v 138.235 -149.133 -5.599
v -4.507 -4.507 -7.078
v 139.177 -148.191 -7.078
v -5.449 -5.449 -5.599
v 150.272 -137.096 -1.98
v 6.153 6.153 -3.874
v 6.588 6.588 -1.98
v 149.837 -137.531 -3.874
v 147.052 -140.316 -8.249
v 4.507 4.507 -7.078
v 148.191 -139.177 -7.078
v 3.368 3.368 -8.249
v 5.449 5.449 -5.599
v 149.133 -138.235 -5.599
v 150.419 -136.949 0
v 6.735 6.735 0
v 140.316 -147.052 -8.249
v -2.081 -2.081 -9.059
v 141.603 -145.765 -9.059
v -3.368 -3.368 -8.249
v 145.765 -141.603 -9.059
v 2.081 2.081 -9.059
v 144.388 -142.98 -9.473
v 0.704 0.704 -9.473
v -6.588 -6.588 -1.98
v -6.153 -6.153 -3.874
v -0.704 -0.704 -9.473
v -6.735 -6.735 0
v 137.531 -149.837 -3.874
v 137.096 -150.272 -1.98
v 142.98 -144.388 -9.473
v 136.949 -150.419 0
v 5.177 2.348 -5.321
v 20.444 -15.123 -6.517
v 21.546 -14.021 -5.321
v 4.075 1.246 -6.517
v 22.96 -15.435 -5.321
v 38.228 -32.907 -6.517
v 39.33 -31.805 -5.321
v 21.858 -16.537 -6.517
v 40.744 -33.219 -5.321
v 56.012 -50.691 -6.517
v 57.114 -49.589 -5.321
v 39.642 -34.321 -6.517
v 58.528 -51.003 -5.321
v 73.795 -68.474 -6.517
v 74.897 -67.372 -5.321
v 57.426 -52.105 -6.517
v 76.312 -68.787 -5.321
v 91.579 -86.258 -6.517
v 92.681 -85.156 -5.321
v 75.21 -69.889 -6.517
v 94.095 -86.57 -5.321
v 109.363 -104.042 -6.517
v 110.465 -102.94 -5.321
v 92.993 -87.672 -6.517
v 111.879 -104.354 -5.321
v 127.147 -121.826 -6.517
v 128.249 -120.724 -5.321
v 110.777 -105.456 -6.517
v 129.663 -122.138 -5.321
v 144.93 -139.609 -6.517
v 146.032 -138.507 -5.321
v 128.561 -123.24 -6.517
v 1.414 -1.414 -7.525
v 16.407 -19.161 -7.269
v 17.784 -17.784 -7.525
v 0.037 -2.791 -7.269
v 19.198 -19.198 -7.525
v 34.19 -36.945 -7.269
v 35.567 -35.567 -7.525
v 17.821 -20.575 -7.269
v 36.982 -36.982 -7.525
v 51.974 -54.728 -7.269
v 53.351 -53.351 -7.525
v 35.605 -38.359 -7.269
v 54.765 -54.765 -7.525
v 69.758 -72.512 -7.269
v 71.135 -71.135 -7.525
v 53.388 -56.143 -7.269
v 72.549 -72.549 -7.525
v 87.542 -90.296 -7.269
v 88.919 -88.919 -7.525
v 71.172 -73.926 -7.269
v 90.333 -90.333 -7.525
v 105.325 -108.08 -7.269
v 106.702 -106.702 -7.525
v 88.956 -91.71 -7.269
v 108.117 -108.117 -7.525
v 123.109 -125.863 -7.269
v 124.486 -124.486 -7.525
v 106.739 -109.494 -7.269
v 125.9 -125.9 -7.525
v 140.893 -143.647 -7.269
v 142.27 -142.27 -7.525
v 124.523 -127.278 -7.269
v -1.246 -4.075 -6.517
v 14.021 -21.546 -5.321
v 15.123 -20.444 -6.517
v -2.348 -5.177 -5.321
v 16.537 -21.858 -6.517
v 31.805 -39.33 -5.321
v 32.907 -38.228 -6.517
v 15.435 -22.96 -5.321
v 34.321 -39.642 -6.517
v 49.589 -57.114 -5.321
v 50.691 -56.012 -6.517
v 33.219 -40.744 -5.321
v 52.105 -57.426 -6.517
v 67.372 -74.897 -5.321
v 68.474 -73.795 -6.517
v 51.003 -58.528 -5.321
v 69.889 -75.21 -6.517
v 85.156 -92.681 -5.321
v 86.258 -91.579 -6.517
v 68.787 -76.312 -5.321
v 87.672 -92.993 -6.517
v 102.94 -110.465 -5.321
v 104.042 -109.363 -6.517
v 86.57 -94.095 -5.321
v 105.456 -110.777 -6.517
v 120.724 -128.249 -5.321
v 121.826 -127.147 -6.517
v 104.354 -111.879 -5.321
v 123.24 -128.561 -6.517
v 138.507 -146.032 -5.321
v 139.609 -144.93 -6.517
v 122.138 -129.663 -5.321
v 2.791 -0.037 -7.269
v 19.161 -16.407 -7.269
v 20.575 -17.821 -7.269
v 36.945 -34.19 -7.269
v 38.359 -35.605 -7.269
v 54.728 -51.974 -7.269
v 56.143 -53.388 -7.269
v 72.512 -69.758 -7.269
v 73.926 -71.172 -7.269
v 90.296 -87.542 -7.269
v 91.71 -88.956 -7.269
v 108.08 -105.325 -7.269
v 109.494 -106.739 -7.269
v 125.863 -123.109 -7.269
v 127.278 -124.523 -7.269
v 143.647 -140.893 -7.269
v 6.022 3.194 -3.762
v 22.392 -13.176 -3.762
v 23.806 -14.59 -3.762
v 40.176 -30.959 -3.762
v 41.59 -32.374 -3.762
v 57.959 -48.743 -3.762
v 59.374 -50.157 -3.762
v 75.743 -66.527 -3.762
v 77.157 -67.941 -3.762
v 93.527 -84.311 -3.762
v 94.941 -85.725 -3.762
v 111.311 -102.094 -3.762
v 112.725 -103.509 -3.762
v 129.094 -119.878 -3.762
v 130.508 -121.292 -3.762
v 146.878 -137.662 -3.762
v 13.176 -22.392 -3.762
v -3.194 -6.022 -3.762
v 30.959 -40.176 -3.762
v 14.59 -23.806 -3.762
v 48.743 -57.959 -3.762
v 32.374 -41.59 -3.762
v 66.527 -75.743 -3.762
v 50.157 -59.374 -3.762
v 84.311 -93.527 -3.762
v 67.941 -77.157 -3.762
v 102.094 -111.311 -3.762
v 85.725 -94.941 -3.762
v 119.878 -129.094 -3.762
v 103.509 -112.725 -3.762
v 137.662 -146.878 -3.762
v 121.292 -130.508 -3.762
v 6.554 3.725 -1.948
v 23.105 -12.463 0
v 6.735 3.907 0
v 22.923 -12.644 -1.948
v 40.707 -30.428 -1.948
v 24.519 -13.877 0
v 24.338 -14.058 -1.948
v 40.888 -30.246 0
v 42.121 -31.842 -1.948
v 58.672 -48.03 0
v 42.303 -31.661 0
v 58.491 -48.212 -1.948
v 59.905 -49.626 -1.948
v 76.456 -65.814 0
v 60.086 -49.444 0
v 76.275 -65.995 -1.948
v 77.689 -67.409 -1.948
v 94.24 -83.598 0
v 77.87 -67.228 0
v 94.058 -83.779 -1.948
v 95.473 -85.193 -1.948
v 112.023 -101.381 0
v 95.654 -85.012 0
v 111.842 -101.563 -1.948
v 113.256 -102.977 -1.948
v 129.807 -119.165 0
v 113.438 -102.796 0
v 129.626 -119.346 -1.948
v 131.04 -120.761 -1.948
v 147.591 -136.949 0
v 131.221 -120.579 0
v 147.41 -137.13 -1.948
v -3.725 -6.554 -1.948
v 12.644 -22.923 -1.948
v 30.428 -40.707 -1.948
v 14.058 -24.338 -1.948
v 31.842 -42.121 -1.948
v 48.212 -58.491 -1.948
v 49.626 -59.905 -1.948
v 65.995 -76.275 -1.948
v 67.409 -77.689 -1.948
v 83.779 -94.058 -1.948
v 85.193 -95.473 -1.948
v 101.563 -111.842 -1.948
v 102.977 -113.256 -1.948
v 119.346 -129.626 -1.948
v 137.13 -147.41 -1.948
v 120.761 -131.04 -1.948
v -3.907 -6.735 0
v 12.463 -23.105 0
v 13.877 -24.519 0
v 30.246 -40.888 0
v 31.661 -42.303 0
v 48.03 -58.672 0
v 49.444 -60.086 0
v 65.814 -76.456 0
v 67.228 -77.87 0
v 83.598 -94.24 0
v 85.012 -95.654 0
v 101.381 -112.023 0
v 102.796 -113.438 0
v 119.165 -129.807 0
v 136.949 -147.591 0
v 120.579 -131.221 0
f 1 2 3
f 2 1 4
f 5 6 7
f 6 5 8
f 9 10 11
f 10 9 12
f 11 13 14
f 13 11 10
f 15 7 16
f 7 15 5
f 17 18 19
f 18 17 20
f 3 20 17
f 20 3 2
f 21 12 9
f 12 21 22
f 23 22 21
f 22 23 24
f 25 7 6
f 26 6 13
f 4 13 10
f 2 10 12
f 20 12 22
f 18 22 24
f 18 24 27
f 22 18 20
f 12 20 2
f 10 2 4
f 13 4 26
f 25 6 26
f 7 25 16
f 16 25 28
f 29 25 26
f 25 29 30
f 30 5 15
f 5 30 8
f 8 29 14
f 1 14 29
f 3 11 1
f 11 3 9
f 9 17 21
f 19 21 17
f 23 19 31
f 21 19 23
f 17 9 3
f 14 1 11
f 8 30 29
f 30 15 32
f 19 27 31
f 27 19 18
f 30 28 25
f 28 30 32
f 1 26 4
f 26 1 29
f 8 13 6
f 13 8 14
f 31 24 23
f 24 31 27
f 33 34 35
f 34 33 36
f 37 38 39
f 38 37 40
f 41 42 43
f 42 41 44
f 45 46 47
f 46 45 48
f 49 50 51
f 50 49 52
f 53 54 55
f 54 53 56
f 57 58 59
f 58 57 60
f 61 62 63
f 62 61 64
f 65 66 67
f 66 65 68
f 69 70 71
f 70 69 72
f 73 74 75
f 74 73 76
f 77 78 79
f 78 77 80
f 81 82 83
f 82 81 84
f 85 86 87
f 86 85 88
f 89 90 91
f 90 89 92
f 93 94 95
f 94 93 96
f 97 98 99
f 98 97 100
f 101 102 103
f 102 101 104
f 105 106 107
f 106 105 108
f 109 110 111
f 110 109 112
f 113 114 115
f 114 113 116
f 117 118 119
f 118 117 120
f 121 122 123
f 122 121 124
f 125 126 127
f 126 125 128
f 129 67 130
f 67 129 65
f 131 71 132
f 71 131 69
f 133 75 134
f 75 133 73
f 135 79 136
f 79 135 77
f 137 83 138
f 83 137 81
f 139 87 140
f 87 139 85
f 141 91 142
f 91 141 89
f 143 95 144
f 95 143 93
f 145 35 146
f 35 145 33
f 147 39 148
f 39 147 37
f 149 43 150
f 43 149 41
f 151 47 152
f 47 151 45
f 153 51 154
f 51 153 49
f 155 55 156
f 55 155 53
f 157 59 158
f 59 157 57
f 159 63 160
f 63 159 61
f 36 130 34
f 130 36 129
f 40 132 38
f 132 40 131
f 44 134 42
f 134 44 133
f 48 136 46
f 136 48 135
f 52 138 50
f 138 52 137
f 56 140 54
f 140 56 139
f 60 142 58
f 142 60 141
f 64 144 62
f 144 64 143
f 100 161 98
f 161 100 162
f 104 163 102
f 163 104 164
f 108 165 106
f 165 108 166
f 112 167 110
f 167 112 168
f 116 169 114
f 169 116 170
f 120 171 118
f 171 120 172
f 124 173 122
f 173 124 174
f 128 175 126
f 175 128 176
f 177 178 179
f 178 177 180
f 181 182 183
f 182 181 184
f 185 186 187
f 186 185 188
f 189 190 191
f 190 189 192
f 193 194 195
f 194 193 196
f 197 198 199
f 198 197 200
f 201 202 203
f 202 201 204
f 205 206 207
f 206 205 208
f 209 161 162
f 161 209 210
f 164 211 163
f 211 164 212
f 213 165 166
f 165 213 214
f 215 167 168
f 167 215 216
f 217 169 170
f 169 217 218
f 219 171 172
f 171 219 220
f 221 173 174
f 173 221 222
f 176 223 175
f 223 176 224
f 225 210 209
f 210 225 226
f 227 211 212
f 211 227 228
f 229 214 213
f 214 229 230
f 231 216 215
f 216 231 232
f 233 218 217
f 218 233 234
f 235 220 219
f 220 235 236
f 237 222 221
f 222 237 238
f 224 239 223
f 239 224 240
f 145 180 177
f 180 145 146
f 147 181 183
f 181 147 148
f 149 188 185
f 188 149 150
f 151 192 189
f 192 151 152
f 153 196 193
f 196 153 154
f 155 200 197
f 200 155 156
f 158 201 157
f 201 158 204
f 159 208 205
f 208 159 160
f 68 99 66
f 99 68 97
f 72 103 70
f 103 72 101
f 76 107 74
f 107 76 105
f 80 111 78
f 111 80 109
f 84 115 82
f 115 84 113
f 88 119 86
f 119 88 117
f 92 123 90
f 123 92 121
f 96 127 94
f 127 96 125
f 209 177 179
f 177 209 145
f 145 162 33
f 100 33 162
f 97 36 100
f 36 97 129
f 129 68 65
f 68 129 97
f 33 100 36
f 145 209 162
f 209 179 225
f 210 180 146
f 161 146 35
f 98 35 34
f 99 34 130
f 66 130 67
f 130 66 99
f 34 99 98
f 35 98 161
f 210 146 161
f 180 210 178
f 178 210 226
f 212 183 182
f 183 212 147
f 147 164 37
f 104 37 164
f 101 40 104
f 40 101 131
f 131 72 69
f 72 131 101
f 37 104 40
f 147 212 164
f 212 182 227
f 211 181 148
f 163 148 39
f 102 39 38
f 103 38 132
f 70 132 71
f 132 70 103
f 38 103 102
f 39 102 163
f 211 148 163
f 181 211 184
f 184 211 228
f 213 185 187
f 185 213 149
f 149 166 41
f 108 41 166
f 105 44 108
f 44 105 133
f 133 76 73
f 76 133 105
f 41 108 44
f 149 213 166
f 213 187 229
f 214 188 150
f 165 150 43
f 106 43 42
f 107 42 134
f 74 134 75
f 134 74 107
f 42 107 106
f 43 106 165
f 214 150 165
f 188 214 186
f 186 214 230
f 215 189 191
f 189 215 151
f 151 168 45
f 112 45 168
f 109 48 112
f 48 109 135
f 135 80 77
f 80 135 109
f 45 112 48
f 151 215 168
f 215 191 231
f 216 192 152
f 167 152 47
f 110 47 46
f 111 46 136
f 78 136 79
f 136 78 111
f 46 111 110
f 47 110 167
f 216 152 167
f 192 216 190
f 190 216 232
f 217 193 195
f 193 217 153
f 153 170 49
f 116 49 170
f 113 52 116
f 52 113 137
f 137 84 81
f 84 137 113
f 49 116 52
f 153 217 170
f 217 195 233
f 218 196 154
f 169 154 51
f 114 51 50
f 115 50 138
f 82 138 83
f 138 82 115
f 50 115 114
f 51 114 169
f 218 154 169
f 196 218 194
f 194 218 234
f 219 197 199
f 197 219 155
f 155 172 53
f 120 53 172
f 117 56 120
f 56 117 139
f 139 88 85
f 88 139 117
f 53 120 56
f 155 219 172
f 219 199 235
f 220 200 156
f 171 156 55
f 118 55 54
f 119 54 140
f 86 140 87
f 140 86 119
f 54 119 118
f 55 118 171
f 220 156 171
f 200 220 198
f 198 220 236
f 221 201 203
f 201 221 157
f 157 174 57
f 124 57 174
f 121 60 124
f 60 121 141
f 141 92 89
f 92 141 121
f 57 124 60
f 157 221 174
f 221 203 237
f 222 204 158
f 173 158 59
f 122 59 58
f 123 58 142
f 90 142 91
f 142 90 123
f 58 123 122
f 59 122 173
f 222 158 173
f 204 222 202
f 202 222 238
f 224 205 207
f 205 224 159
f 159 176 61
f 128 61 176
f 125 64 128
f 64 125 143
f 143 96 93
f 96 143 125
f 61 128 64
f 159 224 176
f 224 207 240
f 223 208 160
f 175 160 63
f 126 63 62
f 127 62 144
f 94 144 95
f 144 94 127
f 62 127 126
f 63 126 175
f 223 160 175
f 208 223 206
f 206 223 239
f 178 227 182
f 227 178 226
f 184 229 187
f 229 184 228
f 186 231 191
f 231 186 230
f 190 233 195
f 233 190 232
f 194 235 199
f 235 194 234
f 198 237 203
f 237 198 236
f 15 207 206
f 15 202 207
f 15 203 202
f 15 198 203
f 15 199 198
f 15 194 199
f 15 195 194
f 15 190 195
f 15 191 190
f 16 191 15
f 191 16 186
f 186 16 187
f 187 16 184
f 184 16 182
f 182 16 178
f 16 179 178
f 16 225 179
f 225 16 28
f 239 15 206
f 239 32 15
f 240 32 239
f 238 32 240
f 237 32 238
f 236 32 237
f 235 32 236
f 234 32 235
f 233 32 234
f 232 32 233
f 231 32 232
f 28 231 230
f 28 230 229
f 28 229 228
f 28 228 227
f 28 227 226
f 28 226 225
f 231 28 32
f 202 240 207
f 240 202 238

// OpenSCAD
rod_r1 = (0.75*25.4)/2;
rod_r0 = rod_r1 - 2;
rod_len = (8*25.4);

wall_t = 2;

e = 0.1;

module rod() {
     difference() {
	  union() {
	       difference() {
		    cylinder( h=rod_len, r=rod_r1);
		    translate( [0, 0, -e]) cylinder( h=rod_len+2*e, r=rod_r0);
	       }
	       for( i = [0 : (rod_len-wall_t)/8 : rod_len-wall_t])
		    translate( [0, 0, i])
			 cylinder( h=wall_t, r=rod_r1);
	  }
	  translate( [0, 0, -e]) {
	       translate( [-rod_r1-e, 0, 0])
		    cube( [ (rod_r1+3)*2, rod_r1+e, rod_len+2*e]);
	  }
     }
}

rotate( [90, 0, 45])
rod();
